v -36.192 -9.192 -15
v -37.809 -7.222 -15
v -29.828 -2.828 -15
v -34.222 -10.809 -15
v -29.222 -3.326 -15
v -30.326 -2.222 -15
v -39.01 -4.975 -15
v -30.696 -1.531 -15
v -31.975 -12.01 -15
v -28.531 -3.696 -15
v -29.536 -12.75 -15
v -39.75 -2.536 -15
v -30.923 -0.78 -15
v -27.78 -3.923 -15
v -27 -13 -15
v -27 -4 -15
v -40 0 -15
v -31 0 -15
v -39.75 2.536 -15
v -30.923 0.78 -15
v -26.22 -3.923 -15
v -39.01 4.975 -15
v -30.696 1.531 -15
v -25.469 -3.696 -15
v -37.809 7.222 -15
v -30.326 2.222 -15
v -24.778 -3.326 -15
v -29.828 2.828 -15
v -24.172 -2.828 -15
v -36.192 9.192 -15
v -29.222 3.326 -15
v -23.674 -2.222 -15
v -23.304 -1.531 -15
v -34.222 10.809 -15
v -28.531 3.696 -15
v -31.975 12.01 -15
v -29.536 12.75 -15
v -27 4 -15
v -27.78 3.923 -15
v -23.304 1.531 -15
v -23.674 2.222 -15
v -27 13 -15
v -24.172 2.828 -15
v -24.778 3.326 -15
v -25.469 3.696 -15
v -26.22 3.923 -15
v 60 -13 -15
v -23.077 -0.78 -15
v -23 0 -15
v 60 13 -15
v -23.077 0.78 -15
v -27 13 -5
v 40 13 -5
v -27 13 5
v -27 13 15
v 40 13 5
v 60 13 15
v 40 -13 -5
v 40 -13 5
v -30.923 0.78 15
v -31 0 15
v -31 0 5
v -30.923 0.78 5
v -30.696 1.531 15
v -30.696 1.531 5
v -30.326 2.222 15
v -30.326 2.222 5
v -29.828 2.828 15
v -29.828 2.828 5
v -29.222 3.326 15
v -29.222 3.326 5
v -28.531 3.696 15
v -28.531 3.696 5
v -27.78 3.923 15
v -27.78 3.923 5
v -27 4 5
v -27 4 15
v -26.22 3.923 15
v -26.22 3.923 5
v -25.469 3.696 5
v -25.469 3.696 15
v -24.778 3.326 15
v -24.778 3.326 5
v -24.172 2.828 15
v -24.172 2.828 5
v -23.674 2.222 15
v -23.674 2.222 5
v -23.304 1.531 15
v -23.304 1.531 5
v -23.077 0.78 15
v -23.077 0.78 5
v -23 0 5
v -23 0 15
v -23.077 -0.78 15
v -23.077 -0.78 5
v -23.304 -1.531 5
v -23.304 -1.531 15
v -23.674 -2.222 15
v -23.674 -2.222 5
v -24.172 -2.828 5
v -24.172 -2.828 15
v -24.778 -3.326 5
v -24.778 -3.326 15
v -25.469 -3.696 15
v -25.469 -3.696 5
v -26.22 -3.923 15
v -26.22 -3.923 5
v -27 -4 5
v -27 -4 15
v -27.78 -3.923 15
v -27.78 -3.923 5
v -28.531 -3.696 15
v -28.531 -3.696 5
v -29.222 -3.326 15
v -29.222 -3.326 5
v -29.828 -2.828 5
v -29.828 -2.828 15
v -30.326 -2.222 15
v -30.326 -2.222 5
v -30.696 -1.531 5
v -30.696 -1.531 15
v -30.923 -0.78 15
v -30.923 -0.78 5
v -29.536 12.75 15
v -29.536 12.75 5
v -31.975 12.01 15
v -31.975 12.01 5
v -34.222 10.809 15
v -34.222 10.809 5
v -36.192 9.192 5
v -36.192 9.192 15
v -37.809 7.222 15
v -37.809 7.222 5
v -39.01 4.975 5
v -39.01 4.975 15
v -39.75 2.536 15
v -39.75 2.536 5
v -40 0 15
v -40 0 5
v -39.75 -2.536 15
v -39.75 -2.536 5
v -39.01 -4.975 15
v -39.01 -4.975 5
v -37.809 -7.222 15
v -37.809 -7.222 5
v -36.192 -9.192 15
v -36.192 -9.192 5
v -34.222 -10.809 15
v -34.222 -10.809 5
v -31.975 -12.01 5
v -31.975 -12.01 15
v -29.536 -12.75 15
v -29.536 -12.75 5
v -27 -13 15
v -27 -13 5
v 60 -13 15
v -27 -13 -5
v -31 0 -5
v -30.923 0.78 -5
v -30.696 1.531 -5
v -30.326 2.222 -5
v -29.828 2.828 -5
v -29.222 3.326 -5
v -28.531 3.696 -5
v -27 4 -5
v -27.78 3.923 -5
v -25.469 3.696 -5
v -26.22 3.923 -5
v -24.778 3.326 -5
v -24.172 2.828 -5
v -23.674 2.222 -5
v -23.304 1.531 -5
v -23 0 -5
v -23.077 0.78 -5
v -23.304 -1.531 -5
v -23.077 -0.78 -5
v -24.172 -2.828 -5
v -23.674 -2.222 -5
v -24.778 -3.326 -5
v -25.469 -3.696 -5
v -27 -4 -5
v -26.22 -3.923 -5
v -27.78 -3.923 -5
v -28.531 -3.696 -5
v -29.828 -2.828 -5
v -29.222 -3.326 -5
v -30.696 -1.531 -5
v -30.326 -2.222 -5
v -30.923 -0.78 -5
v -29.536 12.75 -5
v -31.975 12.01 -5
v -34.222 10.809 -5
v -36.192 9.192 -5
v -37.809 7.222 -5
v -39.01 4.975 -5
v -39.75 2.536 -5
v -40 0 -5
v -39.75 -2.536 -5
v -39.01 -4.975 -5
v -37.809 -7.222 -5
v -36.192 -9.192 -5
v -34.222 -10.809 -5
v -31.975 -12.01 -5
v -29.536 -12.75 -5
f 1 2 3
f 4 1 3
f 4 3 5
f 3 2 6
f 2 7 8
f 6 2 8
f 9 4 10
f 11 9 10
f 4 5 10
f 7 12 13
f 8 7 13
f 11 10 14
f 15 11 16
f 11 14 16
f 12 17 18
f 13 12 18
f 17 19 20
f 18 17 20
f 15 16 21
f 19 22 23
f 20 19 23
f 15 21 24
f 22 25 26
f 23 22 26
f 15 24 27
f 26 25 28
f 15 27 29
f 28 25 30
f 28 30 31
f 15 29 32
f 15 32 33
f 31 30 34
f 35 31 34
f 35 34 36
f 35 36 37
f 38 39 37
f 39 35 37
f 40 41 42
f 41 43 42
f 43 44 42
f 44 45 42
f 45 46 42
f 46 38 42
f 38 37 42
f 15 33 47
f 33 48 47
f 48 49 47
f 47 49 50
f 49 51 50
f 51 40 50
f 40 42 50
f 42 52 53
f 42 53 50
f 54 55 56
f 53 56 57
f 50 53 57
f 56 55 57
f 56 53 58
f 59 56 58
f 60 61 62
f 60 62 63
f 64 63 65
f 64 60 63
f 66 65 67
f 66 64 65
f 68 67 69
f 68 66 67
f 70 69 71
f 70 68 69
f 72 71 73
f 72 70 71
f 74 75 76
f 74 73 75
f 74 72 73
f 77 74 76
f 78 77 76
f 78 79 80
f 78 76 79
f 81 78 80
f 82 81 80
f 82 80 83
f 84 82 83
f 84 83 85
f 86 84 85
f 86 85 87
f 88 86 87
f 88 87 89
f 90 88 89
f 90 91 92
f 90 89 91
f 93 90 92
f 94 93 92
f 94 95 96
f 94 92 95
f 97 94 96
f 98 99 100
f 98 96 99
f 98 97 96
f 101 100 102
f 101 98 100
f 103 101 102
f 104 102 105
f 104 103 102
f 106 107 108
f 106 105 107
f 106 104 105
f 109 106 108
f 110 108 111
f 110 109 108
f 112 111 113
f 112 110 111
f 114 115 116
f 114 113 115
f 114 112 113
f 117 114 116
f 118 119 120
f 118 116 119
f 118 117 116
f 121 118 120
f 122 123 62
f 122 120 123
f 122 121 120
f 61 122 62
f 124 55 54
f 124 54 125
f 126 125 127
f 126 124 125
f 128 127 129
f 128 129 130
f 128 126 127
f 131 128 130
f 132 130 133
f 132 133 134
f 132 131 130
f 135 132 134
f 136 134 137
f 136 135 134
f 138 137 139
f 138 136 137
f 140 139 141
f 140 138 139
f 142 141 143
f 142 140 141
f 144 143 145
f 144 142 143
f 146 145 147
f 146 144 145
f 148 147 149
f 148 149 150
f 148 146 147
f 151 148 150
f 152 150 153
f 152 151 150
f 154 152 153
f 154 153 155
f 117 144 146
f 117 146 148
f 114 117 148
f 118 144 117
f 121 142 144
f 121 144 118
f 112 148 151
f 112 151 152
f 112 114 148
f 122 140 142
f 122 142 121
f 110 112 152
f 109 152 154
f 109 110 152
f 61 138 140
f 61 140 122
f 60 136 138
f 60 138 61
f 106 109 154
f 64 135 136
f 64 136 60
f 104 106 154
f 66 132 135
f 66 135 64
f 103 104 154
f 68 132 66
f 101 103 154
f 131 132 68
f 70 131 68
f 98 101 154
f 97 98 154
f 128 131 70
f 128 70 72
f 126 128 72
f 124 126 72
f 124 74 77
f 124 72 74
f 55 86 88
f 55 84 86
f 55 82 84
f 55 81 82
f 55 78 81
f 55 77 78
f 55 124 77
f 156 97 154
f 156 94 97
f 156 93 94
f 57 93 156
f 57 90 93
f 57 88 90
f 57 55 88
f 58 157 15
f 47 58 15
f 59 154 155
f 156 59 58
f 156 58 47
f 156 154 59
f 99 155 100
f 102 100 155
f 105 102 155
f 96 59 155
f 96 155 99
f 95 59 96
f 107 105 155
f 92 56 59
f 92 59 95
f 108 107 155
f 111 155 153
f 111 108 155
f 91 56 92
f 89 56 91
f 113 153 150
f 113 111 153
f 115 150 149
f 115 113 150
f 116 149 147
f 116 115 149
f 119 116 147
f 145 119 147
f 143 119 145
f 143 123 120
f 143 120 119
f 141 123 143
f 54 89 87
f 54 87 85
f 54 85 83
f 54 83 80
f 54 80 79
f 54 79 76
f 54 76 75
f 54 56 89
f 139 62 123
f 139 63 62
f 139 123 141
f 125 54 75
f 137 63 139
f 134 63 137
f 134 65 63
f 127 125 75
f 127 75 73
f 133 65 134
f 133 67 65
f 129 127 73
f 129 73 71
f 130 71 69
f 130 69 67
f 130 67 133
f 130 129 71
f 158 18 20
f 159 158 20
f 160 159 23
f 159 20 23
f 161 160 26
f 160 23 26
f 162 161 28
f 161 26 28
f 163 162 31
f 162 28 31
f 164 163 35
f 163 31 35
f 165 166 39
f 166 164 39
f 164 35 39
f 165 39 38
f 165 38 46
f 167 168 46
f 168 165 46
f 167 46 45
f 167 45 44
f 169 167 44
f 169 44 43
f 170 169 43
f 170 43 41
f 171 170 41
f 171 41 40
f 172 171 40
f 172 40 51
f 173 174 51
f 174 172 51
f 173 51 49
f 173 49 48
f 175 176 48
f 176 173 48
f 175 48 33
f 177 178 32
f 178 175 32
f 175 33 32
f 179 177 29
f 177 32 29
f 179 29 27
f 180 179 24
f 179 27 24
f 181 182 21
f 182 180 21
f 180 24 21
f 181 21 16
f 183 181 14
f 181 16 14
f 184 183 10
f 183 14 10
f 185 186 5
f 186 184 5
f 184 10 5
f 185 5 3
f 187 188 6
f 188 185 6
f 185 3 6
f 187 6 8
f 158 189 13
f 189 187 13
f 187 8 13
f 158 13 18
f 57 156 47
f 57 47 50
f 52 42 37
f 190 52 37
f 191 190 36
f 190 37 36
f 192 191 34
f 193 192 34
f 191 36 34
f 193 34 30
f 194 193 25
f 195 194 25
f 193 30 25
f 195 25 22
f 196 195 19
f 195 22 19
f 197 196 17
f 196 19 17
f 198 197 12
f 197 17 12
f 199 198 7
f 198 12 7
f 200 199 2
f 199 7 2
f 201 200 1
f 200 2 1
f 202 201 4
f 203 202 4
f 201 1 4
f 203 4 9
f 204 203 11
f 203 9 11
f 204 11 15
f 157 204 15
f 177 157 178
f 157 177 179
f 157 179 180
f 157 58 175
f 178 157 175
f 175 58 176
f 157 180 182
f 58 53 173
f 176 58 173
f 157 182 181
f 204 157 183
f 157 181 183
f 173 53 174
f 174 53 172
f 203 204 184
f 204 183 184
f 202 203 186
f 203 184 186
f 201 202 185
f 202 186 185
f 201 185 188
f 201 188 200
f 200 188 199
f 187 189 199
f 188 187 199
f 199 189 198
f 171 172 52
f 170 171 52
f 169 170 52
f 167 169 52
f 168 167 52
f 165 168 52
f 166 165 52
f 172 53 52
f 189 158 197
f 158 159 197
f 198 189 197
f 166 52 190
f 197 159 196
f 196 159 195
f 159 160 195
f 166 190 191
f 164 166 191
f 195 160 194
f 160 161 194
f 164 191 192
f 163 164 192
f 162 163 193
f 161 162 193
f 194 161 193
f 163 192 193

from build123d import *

# Parameters (mm, degrees)
SKETCH_1_W                = 120
SKETCH_1_H                = 26
EXTRUDE_1_DEPTH           = 15
CUT_EXTRUDE_START         = -15
CUT_EXTRUDE_8_DEPTH       = 15
CUT_EXTRUDE_9_DEPTH       = 64.198101237
CUT_EXTRUDE_9_DEPTH_BACK  = 5
CUT_EXTRUDE_10_DEPTH      = 63.20128616
CUT_EXTRUDE_10_DEPTH_BACK = 63.20128616
SKETCH_7_R                = 4


# Read off the part's stored shape, not the designer's step: 切除-拉伸8
with BuildPart() as part:
    # 草图1 → 凸台-拉伸1 (new body)
    with BuildSketch(Plane.XY):
        Rectangle(SKETCH_1_W, SKETCH_1_H)
    extrude(amount=EXTRUDE_1_DEPTH)

    # 切除-拉伸8 outline → 切除-拉伸8 (cut)
    with BuildSketch(Plane(origin=(0, 0, 0), x_dir=(-1, 0, 0), z_dir=(0, 0, -1)).offset(CUT_EXTRUDE_START)):
        with BuildLine():
            Line((60, 13), (27, 13))
            ThreePointArc((27, 13), (40, 0), (27, -13))
            Line((27, -13), (60, -13))
            Line((60, -13), (60, 13))
        make_face()
    extrude(amount=CUT_EXTRUDE_8_DEPTH, mode=Mode.SUBTRACT)

    # 草图6 → 切除-拉伸9 (cut, two sides: drawn at the far end of the back side and taken through both)
    with BuildSketch(Plane(origin=(0, 0, 0), x_dir=(-1, 0, 0), z_dir=(0, 0, -1)).offset(-CUT_EXTRUDE_9_DEPTH_BACK)):
        Polygon((-40, 191.237926759), (-40, 13), (-40, -13), (-40, -191.237926759), (316.475853517, -191.237926759), (316.475853517, 191.237926759), align=None)
    extrude(amount=CUT_EXTRUDE_9_DEPTH + CUT_EXTRUDE_9_DEPTH_BACK, mode=Mode.SUBTRACT)

    # 草图7 → 切除-拉伸10 (cut, two sides: drawn at the far end of the back side and taken through both)
    with BuildSketch(Plane(origin=(0, 0, 5), x_dir=(-1, 0, 0), z_dir=(0, 0, -1)).offset(-CUT_EXTRUDE_10_DEPTH_BACK)):
        with Locations((27, 0)):
            Circle(SKETCH_7_R)
    extrude(amount=CUT_EXTRUDE_10_DEPTH + CUT_EXTRUDE_10_DEPTH_BACK, mode=Mode.SUBTRACT)

    # 镜向2: part across plane


with BuildPart() as part_1:
    add(part.part)
    add(part.part.mirror(Plane(origin=(0, 0, 0), x_dir=(1, 0, 0), z_dir=(0, 0, -1))))


solid = part_1.part
